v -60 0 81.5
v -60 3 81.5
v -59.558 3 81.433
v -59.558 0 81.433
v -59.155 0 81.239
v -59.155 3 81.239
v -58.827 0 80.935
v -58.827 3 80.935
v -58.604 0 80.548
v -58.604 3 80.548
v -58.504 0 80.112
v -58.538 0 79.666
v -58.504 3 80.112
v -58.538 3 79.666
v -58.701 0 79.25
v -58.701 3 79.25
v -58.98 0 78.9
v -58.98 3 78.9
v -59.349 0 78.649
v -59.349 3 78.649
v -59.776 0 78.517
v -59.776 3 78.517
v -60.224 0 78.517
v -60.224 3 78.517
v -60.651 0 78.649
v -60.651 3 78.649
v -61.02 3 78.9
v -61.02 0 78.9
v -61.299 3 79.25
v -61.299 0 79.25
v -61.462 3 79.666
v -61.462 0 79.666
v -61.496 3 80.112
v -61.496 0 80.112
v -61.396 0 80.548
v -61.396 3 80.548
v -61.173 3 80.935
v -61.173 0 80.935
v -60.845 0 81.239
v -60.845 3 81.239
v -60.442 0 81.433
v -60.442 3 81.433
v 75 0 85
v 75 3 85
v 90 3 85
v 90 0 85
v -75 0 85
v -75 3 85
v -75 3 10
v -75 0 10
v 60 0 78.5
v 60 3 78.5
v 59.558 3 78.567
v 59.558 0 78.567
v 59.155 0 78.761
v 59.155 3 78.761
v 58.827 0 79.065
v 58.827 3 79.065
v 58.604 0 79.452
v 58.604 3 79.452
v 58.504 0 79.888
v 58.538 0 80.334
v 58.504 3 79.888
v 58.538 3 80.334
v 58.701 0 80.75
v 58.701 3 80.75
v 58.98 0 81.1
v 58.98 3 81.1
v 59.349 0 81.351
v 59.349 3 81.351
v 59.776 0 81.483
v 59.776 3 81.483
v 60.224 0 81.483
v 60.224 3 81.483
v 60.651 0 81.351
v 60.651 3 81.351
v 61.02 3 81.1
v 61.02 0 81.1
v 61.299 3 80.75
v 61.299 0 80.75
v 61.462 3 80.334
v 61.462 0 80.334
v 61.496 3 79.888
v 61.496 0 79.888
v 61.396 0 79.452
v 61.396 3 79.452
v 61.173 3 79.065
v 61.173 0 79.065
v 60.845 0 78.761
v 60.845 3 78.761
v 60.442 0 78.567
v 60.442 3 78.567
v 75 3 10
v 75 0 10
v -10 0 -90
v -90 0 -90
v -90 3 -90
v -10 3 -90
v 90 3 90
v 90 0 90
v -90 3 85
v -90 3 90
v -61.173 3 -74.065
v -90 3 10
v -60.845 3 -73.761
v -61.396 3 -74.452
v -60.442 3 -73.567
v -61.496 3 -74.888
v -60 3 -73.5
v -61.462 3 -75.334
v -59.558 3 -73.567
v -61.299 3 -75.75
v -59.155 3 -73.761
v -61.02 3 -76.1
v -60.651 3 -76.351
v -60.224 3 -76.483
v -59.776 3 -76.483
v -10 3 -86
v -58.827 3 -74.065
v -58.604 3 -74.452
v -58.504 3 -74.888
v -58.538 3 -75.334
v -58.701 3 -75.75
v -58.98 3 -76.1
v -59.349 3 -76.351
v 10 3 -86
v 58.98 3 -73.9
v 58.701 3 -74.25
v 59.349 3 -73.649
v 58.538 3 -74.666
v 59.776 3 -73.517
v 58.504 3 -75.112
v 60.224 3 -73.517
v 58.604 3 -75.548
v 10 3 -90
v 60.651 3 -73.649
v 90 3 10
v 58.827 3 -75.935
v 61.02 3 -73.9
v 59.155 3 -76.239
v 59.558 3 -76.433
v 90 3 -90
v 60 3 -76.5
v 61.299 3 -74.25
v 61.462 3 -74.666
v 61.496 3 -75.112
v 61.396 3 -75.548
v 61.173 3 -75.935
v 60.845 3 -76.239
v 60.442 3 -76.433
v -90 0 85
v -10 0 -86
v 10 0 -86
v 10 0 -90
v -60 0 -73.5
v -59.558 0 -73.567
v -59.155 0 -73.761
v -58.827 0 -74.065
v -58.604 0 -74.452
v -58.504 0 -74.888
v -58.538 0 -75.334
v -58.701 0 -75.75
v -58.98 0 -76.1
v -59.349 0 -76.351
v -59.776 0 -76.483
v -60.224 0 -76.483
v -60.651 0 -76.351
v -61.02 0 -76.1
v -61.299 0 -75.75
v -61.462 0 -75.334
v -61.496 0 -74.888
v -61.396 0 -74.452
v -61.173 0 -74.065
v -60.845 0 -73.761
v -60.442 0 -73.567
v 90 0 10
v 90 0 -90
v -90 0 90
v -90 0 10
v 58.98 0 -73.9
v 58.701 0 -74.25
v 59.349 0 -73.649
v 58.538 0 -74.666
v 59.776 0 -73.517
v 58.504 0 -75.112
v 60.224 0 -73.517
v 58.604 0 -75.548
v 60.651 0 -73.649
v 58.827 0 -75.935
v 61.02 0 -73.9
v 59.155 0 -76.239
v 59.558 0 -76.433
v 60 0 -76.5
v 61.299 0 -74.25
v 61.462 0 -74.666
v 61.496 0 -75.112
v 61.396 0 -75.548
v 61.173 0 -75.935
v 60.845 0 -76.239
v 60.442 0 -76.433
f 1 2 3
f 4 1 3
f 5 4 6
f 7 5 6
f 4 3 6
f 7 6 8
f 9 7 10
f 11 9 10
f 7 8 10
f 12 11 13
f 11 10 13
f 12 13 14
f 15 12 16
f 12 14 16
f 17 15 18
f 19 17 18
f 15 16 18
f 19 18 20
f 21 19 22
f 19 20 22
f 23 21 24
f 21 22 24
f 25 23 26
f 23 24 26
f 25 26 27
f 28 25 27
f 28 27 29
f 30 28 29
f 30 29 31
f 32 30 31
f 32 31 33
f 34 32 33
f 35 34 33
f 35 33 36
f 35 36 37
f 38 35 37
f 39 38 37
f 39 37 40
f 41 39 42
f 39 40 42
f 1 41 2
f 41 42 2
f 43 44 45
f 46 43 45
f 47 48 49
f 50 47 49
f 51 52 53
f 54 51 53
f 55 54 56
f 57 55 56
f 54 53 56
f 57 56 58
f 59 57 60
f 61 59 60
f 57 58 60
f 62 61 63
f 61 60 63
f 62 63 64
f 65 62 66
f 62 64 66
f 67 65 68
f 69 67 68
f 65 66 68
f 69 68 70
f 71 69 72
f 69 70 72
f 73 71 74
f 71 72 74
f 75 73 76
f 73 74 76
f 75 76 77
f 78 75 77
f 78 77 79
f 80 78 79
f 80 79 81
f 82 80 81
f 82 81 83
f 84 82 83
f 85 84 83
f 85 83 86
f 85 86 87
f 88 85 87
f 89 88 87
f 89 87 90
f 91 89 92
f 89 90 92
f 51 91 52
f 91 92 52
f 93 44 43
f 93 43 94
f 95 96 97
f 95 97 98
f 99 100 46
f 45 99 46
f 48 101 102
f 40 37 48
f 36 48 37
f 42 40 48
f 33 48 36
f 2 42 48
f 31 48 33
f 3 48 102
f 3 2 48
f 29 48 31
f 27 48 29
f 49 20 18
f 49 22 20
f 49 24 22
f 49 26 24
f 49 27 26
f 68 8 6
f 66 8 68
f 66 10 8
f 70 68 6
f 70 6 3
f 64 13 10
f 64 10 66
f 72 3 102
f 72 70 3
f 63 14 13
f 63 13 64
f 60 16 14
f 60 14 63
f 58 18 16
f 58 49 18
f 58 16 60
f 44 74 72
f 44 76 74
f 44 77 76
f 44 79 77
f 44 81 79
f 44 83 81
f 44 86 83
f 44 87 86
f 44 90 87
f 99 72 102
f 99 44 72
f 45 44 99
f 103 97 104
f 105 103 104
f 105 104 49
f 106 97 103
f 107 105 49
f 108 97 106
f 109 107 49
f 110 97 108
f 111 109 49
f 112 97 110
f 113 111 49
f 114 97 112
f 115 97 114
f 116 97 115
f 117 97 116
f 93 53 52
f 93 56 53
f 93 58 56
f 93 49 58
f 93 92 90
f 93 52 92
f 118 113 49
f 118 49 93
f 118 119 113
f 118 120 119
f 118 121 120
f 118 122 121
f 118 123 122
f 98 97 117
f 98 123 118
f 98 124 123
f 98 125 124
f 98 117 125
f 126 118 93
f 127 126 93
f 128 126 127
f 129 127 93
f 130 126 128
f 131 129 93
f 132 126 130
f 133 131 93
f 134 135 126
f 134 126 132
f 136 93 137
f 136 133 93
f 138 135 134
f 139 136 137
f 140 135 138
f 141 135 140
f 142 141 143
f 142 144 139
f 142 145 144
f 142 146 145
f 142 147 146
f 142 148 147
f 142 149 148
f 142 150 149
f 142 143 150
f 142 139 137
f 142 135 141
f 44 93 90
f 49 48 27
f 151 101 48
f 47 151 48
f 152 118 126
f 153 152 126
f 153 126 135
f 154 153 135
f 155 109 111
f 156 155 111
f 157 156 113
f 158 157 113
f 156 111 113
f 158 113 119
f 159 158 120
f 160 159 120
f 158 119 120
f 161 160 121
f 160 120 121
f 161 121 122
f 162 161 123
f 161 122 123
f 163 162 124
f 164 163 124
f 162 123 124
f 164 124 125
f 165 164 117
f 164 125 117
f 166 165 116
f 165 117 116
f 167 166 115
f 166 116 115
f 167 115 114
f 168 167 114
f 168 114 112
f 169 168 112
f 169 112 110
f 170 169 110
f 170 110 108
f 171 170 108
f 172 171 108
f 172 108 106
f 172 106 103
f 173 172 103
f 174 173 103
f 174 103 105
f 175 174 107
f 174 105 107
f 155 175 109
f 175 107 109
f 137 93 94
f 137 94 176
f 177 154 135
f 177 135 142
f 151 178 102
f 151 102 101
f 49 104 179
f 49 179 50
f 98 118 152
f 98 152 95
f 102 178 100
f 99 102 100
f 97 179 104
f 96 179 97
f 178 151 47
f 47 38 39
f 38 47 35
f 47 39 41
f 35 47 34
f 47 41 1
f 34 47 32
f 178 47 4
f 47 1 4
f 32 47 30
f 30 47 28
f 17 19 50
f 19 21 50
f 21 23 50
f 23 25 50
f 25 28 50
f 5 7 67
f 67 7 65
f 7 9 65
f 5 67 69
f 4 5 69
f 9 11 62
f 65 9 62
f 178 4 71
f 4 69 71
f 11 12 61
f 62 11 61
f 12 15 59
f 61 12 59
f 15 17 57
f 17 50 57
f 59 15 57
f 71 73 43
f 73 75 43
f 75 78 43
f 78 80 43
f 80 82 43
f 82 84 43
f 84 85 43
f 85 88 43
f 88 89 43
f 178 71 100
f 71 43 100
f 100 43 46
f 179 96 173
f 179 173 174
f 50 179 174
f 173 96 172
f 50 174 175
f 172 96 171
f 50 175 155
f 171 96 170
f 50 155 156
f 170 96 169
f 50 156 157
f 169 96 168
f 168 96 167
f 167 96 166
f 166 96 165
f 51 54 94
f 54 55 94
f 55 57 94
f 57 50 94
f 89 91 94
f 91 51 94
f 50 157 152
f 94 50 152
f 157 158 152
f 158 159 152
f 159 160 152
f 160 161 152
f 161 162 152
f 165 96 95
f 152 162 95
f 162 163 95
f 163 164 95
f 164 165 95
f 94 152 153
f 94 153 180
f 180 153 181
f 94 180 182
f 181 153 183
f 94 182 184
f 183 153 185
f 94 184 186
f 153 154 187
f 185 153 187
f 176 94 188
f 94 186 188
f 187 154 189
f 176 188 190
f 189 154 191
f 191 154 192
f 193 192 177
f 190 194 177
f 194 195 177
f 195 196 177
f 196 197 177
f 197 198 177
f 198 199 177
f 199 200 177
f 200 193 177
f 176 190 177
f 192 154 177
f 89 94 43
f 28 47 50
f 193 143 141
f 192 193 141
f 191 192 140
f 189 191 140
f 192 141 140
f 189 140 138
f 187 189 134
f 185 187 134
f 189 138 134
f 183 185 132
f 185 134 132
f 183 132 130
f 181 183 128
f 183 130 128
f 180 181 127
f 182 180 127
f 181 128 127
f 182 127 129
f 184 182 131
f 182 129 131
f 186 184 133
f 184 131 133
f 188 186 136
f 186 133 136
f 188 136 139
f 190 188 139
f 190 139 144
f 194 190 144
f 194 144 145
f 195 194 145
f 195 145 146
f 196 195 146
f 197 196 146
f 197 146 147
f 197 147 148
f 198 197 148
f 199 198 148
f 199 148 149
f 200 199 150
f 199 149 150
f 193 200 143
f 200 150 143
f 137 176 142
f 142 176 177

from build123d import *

# Parameters (mm, degrees)
SKETCH1_W           = 180
SKETCH1_H           = 180
BOSS_EXTRUDE1_DEPTH = 3
SKETCH2_W           = 15
SKETCH2_H           = 75
CUT_EXTRUDE1_DEPTH  = 3
SKETCH3_R           = 1.5
CUT_EXTRUDE2_DEPTH  = 3
SKETCH4_W           = 20
SKETCH4_H           = 4
CUT_EXTRUDE3_DEPTH  = 10


with BuildPart() as part:
    # Sketch1 → Boss-Extrude1 (new body)
    with BuildSketch(Plane(origin=(0, 0, 0), x_dir=(1, 0, 0), z_dir=(0, 1, 0))):
        Rectangle(SKETCH1_W, SKETCH1_H)
    extrude(amount=BOSS_EXTRUDE1_DEPTH)

    # Sketch2 → Cut-Extrude1 (cut)
    with BuildSketch(Plane(origin=(0, 3, 0), x_dir=(1, 0, 0), z_dir=(0, 1, 0))):
        with Locations((-82.5, -47.5)):
            Rectangle(SKETCH2_W, SKETCH2_H)
        with Locations((82.5, -47.5)):
            Rectangle(SKETCH2_W, SKETCH2_H)
    extrude(amount=-CUT_EXTRUDE1_DEPTH, mode=Mode.SUBTRACT)

    # Sketch3 → Cut-Extrude2 (cut)
    with BuildSketch(Plane(origin=(0, 3, 0), x_dir=(1, 0, 0), z_dir=(0, 1, 0))):
        with Locations(Location((-60, -80, 0), (0, 0, 270))):
            Circle(SKETCH3_R)
        with Locations(Location((60, -80, 0), (0, 0, 90))):
            Circle(SKETCH3_R)
        with Locations(Location((-60, 75, 0), (0, 0, 270))):
            Circle(SKETCH3_R)
        with Locations(Location((60, 75, 0), (0, 0, 90))):
            Circle(SKETCH3_R)
    extrude(amount=-CUT_EXTRUDE2_DEPTH, mode=Mode.SUBTRACT)

    # Sketch4 → Cut-Extrude3 (cut)
    with BuildSketch(Plane(origin=(0, 3, 0), x_dir=(1, 0, 0), z_dir=(0, 1, 0))):
        with Locations((0, 88)):
            Rectangle(SKETCH4_W, SKETCH4_H)
    extrude(amount=-CUT_EXTRUDE3_DEPTH, mode=Mode.SUBTRACT)


solid = part.part
